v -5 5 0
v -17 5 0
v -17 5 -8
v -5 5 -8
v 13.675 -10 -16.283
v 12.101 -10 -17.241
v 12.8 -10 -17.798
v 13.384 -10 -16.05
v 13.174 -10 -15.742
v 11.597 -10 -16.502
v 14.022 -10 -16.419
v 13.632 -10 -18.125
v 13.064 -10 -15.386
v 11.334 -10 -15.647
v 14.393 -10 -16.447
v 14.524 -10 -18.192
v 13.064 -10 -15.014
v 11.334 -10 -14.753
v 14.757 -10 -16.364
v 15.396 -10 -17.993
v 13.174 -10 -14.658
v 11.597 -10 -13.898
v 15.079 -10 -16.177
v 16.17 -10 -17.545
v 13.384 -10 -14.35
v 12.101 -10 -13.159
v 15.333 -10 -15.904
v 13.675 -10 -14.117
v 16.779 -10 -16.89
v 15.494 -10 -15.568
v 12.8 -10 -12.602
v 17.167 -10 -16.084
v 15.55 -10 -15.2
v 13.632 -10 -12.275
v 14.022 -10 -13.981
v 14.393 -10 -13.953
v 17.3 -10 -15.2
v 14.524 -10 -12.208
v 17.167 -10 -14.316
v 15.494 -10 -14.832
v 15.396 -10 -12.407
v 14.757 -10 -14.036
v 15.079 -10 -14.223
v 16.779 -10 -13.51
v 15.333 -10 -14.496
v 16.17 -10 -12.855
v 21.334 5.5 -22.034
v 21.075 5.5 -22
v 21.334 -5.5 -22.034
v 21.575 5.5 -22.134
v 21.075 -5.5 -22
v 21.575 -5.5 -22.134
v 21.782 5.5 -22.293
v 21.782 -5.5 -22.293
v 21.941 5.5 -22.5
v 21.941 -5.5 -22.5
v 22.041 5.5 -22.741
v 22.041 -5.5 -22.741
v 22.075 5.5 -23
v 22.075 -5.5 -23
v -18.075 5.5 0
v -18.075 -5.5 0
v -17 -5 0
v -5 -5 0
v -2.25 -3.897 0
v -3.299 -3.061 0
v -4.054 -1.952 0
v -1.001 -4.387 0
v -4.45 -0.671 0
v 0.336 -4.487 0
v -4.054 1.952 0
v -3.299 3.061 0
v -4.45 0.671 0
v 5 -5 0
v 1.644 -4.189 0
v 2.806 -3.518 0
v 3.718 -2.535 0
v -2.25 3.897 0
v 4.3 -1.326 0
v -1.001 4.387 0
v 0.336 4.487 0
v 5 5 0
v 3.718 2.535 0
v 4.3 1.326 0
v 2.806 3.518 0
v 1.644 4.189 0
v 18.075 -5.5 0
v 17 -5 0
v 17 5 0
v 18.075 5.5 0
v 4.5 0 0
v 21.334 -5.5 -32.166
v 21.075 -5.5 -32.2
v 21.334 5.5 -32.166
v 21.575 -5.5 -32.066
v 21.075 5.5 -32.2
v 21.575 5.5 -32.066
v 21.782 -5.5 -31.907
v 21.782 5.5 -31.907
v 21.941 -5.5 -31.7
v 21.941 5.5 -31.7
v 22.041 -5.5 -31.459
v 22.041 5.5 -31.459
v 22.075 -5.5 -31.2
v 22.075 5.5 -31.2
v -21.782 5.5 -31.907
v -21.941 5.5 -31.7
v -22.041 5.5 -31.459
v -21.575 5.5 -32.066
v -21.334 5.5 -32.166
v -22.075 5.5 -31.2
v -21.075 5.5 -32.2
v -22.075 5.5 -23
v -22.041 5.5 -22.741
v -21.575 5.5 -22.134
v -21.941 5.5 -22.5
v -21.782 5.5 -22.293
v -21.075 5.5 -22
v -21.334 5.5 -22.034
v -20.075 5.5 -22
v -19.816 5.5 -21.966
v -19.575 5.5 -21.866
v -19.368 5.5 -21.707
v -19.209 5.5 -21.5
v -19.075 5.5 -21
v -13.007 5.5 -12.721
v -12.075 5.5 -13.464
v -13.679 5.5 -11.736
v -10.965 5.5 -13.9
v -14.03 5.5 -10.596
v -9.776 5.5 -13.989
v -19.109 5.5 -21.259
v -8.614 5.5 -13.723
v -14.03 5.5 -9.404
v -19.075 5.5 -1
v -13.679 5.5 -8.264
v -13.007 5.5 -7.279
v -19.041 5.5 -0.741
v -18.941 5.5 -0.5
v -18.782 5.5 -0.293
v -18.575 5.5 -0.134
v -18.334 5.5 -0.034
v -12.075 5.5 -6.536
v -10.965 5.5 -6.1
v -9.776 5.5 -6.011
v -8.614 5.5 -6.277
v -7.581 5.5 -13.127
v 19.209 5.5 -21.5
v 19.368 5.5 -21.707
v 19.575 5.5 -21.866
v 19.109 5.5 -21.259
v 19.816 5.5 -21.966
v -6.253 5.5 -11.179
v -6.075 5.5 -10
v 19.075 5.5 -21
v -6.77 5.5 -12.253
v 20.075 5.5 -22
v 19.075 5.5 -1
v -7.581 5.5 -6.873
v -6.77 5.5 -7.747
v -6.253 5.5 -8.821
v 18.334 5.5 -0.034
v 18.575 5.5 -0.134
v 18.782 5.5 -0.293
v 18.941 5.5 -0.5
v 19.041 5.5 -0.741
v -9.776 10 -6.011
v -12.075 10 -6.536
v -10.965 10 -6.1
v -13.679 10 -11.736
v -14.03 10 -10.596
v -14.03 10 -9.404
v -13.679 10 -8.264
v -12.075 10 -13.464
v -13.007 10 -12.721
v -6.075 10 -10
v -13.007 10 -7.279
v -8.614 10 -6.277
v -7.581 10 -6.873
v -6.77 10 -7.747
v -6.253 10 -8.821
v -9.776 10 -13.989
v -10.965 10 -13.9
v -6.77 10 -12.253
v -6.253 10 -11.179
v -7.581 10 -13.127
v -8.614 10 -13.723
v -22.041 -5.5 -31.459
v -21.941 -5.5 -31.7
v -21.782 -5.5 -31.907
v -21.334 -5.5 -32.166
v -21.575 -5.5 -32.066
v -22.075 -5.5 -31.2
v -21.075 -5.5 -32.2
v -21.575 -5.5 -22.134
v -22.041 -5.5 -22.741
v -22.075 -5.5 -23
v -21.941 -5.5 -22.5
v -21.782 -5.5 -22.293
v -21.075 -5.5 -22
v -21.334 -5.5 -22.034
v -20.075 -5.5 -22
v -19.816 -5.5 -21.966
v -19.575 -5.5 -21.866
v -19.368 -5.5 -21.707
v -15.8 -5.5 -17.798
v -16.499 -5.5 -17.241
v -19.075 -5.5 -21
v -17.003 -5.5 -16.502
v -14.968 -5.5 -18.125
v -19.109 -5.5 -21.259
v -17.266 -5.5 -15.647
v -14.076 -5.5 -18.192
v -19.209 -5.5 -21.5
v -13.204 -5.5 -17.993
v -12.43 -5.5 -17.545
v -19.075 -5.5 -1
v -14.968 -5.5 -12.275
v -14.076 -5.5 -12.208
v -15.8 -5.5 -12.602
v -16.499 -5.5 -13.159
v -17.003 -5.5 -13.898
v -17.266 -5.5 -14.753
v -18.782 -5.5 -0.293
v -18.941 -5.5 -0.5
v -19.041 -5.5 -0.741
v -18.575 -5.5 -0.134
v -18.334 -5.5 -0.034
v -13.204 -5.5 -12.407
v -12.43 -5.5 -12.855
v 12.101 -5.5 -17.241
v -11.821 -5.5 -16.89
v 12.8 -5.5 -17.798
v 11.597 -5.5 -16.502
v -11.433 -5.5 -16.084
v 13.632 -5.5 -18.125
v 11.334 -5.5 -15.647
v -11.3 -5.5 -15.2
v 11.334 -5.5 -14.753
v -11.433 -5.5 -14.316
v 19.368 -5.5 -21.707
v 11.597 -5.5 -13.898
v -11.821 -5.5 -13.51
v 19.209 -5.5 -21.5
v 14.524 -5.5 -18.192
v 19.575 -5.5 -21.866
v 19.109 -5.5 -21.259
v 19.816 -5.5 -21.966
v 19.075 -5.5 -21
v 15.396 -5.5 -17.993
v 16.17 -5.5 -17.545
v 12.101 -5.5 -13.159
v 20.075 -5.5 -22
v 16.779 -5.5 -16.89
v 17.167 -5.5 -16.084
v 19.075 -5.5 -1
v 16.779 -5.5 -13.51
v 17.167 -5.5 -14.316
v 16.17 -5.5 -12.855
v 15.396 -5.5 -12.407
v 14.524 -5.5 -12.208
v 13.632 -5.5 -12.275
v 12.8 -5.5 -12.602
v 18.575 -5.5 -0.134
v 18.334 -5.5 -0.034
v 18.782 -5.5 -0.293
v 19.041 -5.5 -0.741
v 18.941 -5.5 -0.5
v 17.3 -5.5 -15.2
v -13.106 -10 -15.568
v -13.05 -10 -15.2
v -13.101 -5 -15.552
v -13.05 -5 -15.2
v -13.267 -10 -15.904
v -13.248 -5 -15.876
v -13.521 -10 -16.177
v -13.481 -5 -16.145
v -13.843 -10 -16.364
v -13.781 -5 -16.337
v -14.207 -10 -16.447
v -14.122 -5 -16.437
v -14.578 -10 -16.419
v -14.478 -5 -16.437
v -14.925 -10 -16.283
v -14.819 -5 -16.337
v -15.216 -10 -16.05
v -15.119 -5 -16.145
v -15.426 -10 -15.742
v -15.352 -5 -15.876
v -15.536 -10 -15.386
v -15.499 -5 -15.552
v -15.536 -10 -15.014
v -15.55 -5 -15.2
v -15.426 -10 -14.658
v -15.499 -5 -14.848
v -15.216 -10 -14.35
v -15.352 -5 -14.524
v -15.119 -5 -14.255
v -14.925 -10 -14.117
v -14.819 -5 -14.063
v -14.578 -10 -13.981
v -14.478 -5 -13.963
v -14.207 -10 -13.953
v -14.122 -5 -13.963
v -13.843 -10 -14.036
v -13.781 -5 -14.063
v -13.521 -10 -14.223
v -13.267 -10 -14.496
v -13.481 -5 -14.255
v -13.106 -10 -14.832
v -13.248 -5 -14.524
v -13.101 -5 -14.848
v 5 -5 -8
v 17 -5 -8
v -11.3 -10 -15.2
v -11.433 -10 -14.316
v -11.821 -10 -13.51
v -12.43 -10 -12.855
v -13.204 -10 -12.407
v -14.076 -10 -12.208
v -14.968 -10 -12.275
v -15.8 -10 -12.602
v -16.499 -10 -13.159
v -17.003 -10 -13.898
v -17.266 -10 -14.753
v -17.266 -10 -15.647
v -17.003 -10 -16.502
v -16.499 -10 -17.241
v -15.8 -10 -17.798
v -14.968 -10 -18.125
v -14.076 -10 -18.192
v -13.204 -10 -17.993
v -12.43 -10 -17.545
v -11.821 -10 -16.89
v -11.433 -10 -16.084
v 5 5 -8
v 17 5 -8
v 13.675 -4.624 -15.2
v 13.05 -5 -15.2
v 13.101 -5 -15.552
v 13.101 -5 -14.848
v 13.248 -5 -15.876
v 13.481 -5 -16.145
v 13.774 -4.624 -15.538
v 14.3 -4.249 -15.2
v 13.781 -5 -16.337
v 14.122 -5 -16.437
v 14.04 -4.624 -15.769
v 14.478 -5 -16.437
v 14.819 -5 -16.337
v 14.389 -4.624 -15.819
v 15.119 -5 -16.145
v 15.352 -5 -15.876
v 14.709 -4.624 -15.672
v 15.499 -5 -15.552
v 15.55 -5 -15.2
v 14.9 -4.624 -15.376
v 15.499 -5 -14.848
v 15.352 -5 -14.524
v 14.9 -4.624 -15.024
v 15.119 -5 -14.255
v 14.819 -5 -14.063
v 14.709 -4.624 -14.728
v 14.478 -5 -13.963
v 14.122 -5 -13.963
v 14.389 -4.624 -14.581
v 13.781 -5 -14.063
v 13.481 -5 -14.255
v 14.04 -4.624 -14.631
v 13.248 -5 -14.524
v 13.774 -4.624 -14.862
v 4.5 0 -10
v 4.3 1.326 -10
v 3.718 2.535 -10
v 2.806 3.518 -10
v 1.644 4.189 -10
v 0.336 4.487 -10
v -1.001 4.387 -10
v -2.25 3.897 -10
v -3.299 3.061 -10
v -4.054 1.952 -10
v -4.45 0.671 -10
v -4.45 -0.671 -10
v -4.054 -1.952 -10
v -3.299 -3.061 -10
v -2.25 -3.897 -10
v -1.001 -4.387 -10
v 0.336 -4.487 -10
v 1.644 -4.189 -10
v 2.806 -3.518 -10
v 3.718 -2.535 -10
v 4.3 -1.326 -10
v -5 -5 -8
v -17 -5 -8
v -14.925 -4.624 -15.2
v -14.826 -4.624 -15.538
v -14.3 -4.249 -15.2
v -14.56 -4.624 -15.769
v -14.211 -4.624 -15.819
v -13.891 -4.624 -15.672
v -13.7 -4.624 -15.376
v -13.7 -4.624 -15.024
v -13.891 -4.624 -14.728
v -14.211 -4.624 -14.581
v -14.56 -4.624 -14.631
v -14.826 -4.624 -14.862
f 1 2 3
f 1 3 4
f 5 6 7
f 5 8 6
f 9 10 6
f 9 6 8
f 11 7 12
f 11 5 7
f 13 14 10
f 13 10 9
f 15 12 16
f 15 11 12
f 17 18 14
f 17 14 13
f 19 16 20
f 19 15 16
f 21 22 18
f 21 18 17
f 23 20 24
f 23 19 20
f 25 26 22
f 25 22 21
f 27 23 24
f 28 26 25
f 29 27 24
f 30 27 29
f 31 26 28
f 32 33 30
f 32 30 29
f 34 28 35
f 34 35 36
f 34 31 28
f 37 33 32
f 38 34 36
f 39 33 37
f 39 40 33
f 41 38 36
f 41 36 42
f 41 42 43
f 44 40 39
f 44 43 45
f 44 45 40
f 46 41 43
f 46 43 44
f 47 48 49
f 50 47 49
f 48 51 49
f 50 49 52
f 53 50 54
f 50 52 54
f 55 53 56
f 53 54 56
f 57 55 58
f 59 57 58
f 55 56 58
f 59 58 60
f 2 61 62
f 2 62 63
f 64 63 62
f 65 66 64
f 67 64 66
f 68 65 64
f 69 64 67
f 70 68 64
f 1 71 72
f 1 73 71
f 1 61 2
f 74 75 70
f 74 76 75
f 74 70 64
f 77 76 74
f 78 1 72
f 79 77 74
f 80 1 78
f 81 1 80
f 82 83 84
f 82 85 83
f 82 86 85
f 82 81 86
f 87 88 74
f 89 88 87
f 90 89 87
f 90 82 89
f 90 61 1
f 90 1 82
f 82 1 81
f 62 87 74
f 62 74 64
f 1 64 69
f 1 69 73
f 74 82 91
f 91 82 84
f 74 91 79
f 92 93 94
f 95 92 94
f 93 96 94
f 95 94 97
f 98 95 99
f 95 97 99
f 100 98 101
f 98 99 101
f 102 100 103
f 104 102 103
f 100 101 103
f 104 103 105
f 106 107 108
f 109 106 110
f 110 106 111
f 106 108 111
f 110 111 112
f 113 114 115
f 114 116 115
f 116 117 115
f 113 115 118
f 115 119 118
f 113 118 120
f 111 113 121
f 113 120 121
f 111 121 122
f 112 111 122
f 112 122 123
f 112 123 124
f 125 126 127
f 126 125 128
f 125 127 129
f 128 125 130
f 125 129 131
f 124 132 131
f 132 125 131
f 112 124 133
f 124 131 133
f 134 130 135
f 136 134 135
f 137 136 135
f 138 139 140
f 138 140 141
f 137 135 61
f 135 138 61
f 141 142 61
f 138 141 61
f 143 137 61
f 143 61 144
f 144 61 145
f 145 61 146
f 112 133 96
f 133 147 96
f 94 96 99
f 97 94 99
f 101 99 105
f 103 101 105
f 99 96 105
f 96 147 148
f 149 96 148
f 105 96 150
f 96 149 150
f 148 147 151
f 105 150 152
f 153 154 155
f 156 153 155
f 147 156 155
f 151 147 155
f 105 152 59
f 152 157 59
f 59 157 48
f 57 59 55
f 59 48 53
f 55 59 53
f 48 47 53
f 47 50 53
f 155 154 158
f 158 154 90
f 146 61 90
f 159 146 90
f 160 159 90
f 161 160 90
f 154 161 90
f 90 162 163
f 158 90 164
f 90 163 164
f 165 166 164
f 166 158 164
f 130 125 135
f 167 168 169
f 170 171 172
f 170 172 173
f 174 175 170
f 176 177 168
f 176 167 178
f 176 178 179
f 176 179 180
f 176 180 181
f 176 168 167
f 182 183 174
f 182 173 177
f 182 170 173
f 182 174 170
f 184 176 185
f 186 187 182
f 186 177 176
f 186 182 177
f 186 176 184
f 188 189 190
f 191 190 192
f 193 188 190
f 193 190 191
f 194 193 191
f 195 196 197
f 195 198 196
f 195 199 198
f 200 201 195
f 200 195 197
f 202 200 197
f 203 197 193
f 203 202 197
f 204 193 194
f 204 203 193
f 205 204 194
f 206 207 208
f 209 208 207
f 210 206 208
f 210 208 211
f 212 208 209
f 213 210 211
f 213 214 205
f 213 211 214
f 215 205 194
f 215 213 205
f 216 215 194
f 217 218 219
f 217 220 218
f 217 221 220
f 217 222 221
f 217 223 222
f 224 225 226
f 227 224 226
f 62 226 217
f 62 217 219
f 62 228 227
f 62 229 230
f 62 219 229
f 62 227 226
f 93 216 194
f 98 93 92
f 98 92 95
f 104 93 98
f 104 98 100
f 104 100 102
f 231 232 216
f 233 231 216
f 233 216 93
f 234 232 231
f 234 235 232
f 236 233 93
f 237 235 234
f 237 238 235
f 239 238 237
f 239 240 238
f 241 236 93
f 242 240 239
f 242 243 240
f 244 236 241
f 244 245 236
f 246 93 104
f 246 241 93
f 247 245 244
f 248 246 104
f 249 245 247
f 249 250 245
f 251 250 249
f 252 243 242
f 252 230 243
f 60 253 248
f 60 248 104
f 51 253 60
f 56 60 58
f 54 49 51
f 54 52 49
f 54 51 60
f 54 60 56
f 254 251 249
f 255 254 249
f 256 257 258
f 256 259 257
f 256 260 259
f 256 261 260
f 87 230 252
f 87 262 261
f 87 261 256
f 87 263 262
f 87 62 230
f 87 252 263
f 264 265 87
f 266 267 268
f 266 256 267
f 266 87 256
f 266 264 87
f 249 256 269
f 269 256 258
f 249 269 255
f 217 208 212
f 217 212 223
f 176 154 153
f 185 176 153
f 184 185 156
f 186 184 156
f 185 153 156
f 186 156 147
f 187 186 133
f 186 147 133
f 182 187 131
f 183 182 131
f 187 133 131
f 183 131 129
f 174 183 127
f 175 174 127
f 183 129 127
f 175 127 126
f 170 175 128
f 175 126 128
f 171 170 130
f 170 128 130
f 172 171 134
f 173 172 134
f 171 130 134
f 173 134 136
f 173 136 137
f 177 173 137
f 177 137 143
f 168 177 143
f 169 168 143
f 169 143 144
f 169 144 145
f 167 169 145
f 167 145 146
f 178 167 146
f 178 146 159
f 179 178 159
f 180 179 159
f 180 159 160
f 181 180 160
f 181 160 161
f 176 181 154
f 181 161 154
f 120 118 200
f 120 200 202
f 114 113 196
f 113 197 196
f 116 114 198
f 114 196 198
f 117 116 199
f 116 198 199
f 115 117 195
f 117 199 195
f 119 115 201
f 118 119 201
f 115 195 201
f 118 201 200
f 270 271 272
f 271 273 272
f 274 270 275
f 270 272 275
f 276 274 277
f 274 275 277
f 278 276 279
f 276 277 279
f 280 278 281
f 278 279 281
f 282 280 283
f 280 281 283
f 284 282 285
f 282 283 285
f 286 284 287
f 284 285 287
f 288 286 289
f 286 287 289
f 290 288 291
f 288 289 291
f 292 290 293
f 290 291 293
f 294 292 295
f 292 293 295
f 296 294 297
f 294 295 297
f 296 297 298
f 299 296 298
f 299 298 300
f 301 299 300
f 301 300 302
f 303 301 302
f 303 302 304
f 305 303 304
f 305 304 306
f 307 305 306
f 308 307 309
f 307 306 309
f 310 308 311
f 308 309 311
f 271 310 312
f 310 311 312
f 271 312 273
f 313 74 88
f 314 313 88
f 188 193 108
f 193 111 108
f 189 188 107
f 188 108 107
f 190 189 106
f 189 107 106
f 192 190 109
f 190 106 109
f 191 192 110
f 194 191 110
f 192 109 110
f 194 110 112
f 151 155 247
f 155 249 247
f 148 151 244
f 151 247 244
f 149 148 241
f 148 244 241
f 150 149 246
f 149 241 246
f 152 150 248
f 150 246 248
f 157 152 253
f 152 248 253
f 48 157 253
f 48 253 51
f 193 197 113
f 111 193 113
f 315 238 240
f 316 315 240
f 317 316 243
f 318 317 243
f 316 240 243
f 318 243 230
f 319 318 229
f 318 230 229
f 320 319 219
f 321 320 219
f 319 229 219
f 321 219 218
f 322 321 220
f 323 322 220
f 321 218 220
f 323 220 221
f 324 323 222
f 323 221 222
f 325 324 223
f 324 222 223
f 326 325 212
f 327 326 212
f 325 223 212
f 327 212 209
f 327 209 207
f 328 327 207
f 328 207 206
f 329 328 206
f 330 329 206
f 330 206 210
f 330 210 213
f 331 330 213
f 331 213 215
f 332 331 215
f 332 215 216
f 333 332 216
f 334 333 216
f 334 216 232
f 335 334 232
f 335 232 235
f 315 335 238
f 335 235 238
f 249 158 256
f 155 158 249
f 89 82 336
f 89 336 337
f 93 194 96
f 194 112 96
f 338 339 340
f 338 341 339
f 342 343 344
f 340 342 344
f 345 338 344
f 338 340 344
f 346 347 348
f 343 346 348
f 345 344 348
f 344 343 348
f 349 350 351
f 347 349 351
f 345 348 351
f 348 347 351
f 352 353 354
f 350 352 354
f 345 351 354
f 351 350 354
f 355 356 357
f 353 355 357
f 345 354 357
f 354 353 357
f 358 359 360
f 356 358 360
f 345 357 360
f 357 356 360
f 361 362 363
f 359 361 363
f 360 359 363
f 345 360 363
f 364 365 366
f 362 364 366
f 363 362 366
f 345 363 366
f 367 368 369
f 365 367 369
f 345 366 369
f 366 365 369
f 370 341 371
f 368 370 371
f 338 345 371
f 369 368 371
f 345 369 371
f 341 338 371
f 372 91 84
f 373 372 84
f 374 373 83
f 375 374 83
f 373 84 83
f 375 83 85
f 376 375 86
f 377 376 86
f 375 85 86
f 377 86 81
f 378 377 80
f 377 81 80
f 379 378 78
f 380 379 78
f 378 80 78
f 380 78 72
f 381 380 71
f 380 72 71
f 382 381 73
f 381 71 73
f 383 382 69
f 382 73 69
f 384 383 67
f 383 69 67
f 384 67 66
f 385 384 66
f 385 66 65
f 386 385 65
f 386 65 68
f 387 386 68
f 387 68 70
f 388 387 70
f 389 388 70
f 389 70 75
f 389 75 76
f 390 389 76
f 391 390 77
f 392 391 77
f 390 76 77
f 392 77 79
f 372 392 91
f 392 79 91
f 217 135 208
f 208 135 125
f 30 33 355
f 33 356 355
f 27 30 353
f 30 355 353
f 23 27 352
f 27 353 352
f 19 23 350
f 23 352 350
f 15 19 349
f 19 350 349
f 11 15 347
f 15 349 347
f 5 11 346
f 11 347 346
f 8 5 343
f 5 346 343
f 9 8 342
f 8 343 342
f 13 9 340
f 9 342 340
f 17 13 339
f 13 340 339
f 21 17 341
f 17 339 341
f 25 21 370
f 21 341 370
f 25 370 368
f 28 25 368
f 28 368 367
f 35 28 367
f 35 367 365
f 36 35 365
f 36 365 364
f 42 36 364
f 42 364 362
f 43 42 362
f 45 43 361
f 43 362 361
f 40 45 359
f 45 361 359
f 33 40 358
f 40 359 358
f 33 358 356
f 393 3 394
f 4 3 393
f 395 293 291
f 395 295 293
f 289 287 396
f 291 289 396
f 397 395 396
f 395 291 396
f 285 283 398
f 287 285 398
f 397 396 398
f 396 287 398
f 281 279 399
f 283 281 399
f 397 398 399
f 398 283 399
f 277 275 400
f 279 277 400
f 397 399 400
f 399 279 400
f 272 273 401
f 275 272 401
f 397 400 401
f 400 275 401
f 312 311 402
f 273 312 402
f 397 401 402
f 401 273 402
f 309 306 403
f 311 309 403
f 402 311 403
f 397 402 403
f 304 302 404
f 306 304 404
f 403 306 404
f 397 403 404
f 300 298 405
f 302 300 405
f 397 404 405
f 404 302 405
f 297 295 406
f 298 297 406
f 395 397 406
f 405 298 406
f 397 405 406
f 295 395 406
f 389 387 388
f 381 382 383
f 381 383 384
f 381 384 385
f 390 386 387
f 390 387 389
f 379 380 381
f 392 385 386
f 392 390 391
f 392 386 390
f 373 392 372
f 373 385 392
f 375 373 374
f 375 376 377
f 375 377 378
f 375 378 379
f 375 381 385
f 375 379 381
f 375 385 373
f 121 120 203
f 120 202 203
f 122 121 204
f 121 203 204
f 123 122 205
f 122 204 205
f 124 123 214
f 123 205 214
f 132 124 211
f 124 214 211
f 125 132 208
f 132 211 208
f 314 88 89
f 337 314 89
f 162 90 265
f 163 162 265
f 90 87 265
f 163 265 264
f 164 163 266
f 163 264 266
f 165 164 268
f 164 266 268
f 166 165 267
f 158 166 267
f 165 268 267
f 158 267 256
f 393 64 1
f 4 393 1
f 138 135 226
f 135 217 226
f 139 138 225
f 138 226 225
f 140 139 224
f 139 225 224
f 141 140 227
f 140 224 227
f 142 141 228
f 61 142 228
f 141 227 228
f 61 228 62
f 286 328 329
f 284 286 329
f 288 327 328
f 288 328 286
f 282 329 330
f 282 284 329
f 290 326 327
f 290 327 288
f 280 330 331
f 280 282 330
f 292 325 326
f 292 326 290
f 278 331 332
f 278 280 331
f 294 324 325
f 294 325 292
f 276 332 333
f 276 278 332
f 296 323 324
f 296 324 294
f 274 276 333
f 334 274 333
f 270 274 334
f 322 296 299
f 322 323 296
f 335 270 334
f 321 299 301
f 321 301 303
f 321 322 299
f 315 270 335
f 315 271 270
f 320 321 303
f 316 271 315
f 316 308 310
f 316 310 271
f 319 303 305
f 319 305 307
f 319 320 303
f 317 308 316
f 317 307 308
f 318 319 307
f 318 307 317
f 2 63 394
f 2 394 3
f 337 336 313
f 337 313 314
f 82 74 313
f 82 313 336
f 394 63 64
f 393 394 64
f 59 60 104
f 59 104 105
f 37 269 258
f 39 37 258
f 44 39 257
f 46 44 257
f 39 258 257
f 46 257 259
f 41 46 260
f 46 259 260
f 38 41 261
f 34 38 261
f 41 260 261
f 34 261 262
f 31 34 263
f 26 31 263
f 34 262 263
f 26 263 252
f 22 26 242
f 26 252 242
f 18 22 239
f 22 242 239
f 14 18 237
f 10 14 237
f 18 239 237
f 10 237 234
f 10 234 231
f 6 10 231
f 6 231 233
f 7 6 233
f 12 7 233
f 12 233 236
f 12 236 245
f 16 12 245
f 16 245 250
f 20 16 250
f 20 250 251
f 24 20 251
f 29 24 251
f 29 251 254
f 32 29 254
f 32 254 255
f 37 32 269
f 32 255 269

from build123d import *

# Parameters (mm, degrees)
SKETCH_2_W          = 44.15
SKETCH_2_H          = 11
EXTRUDE_1_DEPTH     = 32.2
SKETCH_3_R          = 3
EXTRUDE_2_DEPTH     = 4.5
M3X0_5_1_D          = 2.5
M3X0_5_1_DEPTH      = 5
M3X0_5_1_TIP        = 0.751075774
SKETCH_7_R          = 4
EXTRUDE_3_DEPTH     = 4.5
SKETCH_8_W          = 3
SKETCH_8_H          = 22
CUT_EXTRUDE_1_DEPTH = 16.5
SKETCH_9_W          = 12
SKETCH_9_H          = 10
CUT_EXTRUDE_2_DEPTH = 8
SKETCH_10_R         = 4.5
CUT_EXTRUDE_3_DEPTH = 10
FILLET_1_R          = 1


with BuildPart() as part:
    # 草圖2 → 填料-伸長1 (new body)
    with BuildSketch(Plane.XY):
        Rectangle(SKETCH_2_W, SKETCH_2_H)
    extrude(amount=-EXTRUDE_1_DEPTH)

    # 草圖3 → 填料-伸長2 (add)
    with BuildSketch(Plane.XZ.offset(5.5)):
        with Locations((-14.3, -15.2)):
            Circle(SKETCH_3_R)
        with Locations((14.3, -15.2)):
            Circle(SKETCH_3_R)
    extrude(amount=EXTRUDE_2_DEPTH)

    # M3x0.5  螺絲攻的螺孔鑽1
    with Locations(Plane(origin=(0, -10, 0), x_dir=(-1, 0, 0), z_dir=(0, -1, 0))):
        with Locations((14.3, 15.2), (-14.3, 15.2)):
            Hole(M3X0_5_1_D / 2, depth=M3X0_5_1_DEPTH)
            with Locations((0, 0, -(M3X0_5_1_DEPTH + M3X0_5_1_TIP / 2))):  # 118° drill point
                Cone(0, M3X0_5_1_D / 2, M3X0_5_1_TIP, mode=Mode.SUBTRACT)

    # 草圖7 → 填料-伸長3 (add)
    with BuildSketch(Plane(origin=(0, 5.5, 0), x_dir=(1, 0, 0), z_dir=(0, 1, 0))):
        with Locations((-10.075, 10)):
            Circle(SKETCH_7_R)
    extrude(amount=EXTRUDE_3_DEPTH)

    # 草圖8 → 除料-伸長1 (cut, through all)
    with BuildSketch(Plane(origin=(0, 5.5, 0), x_dir=(1, 0, 0), z_dir=(0, 1, 0))):
        with Locations((-20.575, 11)):
            Rectangle(SKETCH_8_W, SKETCH_8_H)
        with Locations((20.575, 11)):
            Rectangle(SKETCH_8_W, SKETCH_8_H)
    extrude(amount=-CUT_EXTRUDE_1_DEPTH, mode=Mode.SUBTRACT)

    # 草圖9 → 除料-伸長2 (cut)
    with BuildSketch(Plane.XY):
        with Locations((-11, 0)):
            Rectangle(SKETCH_9_W, SKETCH_9_H)
        with Locations((11, 0)):
            Rectangle(SKETCH_9_W, SKETCH_9_H)
    extrude(amount=-CUT_EXTRUDE_2_DEPTH, mode=Mode.SUBTRACT)

    # 草圖10 → 除料-伸長3 (cut)
    with BuildSketch(Plane.XY):
        Circle(SKETCH_10_R)
    extrude(amount=-CUT_EXTRUDE_3_DEPTH, mode=Mode.SUBTRACT)

    # 圓角1
    fillet_1_edges = [part.edges().sort_by_distance(p)[0] for p in [
        (-22.075, 0, -32.2),
        (19.075, 0, 0),
        (-19.075, 0, 0),
        (22.075, 0, -32.2),
        (-22.075, 0, -22),
        (-19.075, 0, -22),
        (22.075, 0, -22),
        (19.075, 0, -22),
    ]]
    fillet(fillet_1_edges, radius=FILLET_1_R)


solid = part.part
